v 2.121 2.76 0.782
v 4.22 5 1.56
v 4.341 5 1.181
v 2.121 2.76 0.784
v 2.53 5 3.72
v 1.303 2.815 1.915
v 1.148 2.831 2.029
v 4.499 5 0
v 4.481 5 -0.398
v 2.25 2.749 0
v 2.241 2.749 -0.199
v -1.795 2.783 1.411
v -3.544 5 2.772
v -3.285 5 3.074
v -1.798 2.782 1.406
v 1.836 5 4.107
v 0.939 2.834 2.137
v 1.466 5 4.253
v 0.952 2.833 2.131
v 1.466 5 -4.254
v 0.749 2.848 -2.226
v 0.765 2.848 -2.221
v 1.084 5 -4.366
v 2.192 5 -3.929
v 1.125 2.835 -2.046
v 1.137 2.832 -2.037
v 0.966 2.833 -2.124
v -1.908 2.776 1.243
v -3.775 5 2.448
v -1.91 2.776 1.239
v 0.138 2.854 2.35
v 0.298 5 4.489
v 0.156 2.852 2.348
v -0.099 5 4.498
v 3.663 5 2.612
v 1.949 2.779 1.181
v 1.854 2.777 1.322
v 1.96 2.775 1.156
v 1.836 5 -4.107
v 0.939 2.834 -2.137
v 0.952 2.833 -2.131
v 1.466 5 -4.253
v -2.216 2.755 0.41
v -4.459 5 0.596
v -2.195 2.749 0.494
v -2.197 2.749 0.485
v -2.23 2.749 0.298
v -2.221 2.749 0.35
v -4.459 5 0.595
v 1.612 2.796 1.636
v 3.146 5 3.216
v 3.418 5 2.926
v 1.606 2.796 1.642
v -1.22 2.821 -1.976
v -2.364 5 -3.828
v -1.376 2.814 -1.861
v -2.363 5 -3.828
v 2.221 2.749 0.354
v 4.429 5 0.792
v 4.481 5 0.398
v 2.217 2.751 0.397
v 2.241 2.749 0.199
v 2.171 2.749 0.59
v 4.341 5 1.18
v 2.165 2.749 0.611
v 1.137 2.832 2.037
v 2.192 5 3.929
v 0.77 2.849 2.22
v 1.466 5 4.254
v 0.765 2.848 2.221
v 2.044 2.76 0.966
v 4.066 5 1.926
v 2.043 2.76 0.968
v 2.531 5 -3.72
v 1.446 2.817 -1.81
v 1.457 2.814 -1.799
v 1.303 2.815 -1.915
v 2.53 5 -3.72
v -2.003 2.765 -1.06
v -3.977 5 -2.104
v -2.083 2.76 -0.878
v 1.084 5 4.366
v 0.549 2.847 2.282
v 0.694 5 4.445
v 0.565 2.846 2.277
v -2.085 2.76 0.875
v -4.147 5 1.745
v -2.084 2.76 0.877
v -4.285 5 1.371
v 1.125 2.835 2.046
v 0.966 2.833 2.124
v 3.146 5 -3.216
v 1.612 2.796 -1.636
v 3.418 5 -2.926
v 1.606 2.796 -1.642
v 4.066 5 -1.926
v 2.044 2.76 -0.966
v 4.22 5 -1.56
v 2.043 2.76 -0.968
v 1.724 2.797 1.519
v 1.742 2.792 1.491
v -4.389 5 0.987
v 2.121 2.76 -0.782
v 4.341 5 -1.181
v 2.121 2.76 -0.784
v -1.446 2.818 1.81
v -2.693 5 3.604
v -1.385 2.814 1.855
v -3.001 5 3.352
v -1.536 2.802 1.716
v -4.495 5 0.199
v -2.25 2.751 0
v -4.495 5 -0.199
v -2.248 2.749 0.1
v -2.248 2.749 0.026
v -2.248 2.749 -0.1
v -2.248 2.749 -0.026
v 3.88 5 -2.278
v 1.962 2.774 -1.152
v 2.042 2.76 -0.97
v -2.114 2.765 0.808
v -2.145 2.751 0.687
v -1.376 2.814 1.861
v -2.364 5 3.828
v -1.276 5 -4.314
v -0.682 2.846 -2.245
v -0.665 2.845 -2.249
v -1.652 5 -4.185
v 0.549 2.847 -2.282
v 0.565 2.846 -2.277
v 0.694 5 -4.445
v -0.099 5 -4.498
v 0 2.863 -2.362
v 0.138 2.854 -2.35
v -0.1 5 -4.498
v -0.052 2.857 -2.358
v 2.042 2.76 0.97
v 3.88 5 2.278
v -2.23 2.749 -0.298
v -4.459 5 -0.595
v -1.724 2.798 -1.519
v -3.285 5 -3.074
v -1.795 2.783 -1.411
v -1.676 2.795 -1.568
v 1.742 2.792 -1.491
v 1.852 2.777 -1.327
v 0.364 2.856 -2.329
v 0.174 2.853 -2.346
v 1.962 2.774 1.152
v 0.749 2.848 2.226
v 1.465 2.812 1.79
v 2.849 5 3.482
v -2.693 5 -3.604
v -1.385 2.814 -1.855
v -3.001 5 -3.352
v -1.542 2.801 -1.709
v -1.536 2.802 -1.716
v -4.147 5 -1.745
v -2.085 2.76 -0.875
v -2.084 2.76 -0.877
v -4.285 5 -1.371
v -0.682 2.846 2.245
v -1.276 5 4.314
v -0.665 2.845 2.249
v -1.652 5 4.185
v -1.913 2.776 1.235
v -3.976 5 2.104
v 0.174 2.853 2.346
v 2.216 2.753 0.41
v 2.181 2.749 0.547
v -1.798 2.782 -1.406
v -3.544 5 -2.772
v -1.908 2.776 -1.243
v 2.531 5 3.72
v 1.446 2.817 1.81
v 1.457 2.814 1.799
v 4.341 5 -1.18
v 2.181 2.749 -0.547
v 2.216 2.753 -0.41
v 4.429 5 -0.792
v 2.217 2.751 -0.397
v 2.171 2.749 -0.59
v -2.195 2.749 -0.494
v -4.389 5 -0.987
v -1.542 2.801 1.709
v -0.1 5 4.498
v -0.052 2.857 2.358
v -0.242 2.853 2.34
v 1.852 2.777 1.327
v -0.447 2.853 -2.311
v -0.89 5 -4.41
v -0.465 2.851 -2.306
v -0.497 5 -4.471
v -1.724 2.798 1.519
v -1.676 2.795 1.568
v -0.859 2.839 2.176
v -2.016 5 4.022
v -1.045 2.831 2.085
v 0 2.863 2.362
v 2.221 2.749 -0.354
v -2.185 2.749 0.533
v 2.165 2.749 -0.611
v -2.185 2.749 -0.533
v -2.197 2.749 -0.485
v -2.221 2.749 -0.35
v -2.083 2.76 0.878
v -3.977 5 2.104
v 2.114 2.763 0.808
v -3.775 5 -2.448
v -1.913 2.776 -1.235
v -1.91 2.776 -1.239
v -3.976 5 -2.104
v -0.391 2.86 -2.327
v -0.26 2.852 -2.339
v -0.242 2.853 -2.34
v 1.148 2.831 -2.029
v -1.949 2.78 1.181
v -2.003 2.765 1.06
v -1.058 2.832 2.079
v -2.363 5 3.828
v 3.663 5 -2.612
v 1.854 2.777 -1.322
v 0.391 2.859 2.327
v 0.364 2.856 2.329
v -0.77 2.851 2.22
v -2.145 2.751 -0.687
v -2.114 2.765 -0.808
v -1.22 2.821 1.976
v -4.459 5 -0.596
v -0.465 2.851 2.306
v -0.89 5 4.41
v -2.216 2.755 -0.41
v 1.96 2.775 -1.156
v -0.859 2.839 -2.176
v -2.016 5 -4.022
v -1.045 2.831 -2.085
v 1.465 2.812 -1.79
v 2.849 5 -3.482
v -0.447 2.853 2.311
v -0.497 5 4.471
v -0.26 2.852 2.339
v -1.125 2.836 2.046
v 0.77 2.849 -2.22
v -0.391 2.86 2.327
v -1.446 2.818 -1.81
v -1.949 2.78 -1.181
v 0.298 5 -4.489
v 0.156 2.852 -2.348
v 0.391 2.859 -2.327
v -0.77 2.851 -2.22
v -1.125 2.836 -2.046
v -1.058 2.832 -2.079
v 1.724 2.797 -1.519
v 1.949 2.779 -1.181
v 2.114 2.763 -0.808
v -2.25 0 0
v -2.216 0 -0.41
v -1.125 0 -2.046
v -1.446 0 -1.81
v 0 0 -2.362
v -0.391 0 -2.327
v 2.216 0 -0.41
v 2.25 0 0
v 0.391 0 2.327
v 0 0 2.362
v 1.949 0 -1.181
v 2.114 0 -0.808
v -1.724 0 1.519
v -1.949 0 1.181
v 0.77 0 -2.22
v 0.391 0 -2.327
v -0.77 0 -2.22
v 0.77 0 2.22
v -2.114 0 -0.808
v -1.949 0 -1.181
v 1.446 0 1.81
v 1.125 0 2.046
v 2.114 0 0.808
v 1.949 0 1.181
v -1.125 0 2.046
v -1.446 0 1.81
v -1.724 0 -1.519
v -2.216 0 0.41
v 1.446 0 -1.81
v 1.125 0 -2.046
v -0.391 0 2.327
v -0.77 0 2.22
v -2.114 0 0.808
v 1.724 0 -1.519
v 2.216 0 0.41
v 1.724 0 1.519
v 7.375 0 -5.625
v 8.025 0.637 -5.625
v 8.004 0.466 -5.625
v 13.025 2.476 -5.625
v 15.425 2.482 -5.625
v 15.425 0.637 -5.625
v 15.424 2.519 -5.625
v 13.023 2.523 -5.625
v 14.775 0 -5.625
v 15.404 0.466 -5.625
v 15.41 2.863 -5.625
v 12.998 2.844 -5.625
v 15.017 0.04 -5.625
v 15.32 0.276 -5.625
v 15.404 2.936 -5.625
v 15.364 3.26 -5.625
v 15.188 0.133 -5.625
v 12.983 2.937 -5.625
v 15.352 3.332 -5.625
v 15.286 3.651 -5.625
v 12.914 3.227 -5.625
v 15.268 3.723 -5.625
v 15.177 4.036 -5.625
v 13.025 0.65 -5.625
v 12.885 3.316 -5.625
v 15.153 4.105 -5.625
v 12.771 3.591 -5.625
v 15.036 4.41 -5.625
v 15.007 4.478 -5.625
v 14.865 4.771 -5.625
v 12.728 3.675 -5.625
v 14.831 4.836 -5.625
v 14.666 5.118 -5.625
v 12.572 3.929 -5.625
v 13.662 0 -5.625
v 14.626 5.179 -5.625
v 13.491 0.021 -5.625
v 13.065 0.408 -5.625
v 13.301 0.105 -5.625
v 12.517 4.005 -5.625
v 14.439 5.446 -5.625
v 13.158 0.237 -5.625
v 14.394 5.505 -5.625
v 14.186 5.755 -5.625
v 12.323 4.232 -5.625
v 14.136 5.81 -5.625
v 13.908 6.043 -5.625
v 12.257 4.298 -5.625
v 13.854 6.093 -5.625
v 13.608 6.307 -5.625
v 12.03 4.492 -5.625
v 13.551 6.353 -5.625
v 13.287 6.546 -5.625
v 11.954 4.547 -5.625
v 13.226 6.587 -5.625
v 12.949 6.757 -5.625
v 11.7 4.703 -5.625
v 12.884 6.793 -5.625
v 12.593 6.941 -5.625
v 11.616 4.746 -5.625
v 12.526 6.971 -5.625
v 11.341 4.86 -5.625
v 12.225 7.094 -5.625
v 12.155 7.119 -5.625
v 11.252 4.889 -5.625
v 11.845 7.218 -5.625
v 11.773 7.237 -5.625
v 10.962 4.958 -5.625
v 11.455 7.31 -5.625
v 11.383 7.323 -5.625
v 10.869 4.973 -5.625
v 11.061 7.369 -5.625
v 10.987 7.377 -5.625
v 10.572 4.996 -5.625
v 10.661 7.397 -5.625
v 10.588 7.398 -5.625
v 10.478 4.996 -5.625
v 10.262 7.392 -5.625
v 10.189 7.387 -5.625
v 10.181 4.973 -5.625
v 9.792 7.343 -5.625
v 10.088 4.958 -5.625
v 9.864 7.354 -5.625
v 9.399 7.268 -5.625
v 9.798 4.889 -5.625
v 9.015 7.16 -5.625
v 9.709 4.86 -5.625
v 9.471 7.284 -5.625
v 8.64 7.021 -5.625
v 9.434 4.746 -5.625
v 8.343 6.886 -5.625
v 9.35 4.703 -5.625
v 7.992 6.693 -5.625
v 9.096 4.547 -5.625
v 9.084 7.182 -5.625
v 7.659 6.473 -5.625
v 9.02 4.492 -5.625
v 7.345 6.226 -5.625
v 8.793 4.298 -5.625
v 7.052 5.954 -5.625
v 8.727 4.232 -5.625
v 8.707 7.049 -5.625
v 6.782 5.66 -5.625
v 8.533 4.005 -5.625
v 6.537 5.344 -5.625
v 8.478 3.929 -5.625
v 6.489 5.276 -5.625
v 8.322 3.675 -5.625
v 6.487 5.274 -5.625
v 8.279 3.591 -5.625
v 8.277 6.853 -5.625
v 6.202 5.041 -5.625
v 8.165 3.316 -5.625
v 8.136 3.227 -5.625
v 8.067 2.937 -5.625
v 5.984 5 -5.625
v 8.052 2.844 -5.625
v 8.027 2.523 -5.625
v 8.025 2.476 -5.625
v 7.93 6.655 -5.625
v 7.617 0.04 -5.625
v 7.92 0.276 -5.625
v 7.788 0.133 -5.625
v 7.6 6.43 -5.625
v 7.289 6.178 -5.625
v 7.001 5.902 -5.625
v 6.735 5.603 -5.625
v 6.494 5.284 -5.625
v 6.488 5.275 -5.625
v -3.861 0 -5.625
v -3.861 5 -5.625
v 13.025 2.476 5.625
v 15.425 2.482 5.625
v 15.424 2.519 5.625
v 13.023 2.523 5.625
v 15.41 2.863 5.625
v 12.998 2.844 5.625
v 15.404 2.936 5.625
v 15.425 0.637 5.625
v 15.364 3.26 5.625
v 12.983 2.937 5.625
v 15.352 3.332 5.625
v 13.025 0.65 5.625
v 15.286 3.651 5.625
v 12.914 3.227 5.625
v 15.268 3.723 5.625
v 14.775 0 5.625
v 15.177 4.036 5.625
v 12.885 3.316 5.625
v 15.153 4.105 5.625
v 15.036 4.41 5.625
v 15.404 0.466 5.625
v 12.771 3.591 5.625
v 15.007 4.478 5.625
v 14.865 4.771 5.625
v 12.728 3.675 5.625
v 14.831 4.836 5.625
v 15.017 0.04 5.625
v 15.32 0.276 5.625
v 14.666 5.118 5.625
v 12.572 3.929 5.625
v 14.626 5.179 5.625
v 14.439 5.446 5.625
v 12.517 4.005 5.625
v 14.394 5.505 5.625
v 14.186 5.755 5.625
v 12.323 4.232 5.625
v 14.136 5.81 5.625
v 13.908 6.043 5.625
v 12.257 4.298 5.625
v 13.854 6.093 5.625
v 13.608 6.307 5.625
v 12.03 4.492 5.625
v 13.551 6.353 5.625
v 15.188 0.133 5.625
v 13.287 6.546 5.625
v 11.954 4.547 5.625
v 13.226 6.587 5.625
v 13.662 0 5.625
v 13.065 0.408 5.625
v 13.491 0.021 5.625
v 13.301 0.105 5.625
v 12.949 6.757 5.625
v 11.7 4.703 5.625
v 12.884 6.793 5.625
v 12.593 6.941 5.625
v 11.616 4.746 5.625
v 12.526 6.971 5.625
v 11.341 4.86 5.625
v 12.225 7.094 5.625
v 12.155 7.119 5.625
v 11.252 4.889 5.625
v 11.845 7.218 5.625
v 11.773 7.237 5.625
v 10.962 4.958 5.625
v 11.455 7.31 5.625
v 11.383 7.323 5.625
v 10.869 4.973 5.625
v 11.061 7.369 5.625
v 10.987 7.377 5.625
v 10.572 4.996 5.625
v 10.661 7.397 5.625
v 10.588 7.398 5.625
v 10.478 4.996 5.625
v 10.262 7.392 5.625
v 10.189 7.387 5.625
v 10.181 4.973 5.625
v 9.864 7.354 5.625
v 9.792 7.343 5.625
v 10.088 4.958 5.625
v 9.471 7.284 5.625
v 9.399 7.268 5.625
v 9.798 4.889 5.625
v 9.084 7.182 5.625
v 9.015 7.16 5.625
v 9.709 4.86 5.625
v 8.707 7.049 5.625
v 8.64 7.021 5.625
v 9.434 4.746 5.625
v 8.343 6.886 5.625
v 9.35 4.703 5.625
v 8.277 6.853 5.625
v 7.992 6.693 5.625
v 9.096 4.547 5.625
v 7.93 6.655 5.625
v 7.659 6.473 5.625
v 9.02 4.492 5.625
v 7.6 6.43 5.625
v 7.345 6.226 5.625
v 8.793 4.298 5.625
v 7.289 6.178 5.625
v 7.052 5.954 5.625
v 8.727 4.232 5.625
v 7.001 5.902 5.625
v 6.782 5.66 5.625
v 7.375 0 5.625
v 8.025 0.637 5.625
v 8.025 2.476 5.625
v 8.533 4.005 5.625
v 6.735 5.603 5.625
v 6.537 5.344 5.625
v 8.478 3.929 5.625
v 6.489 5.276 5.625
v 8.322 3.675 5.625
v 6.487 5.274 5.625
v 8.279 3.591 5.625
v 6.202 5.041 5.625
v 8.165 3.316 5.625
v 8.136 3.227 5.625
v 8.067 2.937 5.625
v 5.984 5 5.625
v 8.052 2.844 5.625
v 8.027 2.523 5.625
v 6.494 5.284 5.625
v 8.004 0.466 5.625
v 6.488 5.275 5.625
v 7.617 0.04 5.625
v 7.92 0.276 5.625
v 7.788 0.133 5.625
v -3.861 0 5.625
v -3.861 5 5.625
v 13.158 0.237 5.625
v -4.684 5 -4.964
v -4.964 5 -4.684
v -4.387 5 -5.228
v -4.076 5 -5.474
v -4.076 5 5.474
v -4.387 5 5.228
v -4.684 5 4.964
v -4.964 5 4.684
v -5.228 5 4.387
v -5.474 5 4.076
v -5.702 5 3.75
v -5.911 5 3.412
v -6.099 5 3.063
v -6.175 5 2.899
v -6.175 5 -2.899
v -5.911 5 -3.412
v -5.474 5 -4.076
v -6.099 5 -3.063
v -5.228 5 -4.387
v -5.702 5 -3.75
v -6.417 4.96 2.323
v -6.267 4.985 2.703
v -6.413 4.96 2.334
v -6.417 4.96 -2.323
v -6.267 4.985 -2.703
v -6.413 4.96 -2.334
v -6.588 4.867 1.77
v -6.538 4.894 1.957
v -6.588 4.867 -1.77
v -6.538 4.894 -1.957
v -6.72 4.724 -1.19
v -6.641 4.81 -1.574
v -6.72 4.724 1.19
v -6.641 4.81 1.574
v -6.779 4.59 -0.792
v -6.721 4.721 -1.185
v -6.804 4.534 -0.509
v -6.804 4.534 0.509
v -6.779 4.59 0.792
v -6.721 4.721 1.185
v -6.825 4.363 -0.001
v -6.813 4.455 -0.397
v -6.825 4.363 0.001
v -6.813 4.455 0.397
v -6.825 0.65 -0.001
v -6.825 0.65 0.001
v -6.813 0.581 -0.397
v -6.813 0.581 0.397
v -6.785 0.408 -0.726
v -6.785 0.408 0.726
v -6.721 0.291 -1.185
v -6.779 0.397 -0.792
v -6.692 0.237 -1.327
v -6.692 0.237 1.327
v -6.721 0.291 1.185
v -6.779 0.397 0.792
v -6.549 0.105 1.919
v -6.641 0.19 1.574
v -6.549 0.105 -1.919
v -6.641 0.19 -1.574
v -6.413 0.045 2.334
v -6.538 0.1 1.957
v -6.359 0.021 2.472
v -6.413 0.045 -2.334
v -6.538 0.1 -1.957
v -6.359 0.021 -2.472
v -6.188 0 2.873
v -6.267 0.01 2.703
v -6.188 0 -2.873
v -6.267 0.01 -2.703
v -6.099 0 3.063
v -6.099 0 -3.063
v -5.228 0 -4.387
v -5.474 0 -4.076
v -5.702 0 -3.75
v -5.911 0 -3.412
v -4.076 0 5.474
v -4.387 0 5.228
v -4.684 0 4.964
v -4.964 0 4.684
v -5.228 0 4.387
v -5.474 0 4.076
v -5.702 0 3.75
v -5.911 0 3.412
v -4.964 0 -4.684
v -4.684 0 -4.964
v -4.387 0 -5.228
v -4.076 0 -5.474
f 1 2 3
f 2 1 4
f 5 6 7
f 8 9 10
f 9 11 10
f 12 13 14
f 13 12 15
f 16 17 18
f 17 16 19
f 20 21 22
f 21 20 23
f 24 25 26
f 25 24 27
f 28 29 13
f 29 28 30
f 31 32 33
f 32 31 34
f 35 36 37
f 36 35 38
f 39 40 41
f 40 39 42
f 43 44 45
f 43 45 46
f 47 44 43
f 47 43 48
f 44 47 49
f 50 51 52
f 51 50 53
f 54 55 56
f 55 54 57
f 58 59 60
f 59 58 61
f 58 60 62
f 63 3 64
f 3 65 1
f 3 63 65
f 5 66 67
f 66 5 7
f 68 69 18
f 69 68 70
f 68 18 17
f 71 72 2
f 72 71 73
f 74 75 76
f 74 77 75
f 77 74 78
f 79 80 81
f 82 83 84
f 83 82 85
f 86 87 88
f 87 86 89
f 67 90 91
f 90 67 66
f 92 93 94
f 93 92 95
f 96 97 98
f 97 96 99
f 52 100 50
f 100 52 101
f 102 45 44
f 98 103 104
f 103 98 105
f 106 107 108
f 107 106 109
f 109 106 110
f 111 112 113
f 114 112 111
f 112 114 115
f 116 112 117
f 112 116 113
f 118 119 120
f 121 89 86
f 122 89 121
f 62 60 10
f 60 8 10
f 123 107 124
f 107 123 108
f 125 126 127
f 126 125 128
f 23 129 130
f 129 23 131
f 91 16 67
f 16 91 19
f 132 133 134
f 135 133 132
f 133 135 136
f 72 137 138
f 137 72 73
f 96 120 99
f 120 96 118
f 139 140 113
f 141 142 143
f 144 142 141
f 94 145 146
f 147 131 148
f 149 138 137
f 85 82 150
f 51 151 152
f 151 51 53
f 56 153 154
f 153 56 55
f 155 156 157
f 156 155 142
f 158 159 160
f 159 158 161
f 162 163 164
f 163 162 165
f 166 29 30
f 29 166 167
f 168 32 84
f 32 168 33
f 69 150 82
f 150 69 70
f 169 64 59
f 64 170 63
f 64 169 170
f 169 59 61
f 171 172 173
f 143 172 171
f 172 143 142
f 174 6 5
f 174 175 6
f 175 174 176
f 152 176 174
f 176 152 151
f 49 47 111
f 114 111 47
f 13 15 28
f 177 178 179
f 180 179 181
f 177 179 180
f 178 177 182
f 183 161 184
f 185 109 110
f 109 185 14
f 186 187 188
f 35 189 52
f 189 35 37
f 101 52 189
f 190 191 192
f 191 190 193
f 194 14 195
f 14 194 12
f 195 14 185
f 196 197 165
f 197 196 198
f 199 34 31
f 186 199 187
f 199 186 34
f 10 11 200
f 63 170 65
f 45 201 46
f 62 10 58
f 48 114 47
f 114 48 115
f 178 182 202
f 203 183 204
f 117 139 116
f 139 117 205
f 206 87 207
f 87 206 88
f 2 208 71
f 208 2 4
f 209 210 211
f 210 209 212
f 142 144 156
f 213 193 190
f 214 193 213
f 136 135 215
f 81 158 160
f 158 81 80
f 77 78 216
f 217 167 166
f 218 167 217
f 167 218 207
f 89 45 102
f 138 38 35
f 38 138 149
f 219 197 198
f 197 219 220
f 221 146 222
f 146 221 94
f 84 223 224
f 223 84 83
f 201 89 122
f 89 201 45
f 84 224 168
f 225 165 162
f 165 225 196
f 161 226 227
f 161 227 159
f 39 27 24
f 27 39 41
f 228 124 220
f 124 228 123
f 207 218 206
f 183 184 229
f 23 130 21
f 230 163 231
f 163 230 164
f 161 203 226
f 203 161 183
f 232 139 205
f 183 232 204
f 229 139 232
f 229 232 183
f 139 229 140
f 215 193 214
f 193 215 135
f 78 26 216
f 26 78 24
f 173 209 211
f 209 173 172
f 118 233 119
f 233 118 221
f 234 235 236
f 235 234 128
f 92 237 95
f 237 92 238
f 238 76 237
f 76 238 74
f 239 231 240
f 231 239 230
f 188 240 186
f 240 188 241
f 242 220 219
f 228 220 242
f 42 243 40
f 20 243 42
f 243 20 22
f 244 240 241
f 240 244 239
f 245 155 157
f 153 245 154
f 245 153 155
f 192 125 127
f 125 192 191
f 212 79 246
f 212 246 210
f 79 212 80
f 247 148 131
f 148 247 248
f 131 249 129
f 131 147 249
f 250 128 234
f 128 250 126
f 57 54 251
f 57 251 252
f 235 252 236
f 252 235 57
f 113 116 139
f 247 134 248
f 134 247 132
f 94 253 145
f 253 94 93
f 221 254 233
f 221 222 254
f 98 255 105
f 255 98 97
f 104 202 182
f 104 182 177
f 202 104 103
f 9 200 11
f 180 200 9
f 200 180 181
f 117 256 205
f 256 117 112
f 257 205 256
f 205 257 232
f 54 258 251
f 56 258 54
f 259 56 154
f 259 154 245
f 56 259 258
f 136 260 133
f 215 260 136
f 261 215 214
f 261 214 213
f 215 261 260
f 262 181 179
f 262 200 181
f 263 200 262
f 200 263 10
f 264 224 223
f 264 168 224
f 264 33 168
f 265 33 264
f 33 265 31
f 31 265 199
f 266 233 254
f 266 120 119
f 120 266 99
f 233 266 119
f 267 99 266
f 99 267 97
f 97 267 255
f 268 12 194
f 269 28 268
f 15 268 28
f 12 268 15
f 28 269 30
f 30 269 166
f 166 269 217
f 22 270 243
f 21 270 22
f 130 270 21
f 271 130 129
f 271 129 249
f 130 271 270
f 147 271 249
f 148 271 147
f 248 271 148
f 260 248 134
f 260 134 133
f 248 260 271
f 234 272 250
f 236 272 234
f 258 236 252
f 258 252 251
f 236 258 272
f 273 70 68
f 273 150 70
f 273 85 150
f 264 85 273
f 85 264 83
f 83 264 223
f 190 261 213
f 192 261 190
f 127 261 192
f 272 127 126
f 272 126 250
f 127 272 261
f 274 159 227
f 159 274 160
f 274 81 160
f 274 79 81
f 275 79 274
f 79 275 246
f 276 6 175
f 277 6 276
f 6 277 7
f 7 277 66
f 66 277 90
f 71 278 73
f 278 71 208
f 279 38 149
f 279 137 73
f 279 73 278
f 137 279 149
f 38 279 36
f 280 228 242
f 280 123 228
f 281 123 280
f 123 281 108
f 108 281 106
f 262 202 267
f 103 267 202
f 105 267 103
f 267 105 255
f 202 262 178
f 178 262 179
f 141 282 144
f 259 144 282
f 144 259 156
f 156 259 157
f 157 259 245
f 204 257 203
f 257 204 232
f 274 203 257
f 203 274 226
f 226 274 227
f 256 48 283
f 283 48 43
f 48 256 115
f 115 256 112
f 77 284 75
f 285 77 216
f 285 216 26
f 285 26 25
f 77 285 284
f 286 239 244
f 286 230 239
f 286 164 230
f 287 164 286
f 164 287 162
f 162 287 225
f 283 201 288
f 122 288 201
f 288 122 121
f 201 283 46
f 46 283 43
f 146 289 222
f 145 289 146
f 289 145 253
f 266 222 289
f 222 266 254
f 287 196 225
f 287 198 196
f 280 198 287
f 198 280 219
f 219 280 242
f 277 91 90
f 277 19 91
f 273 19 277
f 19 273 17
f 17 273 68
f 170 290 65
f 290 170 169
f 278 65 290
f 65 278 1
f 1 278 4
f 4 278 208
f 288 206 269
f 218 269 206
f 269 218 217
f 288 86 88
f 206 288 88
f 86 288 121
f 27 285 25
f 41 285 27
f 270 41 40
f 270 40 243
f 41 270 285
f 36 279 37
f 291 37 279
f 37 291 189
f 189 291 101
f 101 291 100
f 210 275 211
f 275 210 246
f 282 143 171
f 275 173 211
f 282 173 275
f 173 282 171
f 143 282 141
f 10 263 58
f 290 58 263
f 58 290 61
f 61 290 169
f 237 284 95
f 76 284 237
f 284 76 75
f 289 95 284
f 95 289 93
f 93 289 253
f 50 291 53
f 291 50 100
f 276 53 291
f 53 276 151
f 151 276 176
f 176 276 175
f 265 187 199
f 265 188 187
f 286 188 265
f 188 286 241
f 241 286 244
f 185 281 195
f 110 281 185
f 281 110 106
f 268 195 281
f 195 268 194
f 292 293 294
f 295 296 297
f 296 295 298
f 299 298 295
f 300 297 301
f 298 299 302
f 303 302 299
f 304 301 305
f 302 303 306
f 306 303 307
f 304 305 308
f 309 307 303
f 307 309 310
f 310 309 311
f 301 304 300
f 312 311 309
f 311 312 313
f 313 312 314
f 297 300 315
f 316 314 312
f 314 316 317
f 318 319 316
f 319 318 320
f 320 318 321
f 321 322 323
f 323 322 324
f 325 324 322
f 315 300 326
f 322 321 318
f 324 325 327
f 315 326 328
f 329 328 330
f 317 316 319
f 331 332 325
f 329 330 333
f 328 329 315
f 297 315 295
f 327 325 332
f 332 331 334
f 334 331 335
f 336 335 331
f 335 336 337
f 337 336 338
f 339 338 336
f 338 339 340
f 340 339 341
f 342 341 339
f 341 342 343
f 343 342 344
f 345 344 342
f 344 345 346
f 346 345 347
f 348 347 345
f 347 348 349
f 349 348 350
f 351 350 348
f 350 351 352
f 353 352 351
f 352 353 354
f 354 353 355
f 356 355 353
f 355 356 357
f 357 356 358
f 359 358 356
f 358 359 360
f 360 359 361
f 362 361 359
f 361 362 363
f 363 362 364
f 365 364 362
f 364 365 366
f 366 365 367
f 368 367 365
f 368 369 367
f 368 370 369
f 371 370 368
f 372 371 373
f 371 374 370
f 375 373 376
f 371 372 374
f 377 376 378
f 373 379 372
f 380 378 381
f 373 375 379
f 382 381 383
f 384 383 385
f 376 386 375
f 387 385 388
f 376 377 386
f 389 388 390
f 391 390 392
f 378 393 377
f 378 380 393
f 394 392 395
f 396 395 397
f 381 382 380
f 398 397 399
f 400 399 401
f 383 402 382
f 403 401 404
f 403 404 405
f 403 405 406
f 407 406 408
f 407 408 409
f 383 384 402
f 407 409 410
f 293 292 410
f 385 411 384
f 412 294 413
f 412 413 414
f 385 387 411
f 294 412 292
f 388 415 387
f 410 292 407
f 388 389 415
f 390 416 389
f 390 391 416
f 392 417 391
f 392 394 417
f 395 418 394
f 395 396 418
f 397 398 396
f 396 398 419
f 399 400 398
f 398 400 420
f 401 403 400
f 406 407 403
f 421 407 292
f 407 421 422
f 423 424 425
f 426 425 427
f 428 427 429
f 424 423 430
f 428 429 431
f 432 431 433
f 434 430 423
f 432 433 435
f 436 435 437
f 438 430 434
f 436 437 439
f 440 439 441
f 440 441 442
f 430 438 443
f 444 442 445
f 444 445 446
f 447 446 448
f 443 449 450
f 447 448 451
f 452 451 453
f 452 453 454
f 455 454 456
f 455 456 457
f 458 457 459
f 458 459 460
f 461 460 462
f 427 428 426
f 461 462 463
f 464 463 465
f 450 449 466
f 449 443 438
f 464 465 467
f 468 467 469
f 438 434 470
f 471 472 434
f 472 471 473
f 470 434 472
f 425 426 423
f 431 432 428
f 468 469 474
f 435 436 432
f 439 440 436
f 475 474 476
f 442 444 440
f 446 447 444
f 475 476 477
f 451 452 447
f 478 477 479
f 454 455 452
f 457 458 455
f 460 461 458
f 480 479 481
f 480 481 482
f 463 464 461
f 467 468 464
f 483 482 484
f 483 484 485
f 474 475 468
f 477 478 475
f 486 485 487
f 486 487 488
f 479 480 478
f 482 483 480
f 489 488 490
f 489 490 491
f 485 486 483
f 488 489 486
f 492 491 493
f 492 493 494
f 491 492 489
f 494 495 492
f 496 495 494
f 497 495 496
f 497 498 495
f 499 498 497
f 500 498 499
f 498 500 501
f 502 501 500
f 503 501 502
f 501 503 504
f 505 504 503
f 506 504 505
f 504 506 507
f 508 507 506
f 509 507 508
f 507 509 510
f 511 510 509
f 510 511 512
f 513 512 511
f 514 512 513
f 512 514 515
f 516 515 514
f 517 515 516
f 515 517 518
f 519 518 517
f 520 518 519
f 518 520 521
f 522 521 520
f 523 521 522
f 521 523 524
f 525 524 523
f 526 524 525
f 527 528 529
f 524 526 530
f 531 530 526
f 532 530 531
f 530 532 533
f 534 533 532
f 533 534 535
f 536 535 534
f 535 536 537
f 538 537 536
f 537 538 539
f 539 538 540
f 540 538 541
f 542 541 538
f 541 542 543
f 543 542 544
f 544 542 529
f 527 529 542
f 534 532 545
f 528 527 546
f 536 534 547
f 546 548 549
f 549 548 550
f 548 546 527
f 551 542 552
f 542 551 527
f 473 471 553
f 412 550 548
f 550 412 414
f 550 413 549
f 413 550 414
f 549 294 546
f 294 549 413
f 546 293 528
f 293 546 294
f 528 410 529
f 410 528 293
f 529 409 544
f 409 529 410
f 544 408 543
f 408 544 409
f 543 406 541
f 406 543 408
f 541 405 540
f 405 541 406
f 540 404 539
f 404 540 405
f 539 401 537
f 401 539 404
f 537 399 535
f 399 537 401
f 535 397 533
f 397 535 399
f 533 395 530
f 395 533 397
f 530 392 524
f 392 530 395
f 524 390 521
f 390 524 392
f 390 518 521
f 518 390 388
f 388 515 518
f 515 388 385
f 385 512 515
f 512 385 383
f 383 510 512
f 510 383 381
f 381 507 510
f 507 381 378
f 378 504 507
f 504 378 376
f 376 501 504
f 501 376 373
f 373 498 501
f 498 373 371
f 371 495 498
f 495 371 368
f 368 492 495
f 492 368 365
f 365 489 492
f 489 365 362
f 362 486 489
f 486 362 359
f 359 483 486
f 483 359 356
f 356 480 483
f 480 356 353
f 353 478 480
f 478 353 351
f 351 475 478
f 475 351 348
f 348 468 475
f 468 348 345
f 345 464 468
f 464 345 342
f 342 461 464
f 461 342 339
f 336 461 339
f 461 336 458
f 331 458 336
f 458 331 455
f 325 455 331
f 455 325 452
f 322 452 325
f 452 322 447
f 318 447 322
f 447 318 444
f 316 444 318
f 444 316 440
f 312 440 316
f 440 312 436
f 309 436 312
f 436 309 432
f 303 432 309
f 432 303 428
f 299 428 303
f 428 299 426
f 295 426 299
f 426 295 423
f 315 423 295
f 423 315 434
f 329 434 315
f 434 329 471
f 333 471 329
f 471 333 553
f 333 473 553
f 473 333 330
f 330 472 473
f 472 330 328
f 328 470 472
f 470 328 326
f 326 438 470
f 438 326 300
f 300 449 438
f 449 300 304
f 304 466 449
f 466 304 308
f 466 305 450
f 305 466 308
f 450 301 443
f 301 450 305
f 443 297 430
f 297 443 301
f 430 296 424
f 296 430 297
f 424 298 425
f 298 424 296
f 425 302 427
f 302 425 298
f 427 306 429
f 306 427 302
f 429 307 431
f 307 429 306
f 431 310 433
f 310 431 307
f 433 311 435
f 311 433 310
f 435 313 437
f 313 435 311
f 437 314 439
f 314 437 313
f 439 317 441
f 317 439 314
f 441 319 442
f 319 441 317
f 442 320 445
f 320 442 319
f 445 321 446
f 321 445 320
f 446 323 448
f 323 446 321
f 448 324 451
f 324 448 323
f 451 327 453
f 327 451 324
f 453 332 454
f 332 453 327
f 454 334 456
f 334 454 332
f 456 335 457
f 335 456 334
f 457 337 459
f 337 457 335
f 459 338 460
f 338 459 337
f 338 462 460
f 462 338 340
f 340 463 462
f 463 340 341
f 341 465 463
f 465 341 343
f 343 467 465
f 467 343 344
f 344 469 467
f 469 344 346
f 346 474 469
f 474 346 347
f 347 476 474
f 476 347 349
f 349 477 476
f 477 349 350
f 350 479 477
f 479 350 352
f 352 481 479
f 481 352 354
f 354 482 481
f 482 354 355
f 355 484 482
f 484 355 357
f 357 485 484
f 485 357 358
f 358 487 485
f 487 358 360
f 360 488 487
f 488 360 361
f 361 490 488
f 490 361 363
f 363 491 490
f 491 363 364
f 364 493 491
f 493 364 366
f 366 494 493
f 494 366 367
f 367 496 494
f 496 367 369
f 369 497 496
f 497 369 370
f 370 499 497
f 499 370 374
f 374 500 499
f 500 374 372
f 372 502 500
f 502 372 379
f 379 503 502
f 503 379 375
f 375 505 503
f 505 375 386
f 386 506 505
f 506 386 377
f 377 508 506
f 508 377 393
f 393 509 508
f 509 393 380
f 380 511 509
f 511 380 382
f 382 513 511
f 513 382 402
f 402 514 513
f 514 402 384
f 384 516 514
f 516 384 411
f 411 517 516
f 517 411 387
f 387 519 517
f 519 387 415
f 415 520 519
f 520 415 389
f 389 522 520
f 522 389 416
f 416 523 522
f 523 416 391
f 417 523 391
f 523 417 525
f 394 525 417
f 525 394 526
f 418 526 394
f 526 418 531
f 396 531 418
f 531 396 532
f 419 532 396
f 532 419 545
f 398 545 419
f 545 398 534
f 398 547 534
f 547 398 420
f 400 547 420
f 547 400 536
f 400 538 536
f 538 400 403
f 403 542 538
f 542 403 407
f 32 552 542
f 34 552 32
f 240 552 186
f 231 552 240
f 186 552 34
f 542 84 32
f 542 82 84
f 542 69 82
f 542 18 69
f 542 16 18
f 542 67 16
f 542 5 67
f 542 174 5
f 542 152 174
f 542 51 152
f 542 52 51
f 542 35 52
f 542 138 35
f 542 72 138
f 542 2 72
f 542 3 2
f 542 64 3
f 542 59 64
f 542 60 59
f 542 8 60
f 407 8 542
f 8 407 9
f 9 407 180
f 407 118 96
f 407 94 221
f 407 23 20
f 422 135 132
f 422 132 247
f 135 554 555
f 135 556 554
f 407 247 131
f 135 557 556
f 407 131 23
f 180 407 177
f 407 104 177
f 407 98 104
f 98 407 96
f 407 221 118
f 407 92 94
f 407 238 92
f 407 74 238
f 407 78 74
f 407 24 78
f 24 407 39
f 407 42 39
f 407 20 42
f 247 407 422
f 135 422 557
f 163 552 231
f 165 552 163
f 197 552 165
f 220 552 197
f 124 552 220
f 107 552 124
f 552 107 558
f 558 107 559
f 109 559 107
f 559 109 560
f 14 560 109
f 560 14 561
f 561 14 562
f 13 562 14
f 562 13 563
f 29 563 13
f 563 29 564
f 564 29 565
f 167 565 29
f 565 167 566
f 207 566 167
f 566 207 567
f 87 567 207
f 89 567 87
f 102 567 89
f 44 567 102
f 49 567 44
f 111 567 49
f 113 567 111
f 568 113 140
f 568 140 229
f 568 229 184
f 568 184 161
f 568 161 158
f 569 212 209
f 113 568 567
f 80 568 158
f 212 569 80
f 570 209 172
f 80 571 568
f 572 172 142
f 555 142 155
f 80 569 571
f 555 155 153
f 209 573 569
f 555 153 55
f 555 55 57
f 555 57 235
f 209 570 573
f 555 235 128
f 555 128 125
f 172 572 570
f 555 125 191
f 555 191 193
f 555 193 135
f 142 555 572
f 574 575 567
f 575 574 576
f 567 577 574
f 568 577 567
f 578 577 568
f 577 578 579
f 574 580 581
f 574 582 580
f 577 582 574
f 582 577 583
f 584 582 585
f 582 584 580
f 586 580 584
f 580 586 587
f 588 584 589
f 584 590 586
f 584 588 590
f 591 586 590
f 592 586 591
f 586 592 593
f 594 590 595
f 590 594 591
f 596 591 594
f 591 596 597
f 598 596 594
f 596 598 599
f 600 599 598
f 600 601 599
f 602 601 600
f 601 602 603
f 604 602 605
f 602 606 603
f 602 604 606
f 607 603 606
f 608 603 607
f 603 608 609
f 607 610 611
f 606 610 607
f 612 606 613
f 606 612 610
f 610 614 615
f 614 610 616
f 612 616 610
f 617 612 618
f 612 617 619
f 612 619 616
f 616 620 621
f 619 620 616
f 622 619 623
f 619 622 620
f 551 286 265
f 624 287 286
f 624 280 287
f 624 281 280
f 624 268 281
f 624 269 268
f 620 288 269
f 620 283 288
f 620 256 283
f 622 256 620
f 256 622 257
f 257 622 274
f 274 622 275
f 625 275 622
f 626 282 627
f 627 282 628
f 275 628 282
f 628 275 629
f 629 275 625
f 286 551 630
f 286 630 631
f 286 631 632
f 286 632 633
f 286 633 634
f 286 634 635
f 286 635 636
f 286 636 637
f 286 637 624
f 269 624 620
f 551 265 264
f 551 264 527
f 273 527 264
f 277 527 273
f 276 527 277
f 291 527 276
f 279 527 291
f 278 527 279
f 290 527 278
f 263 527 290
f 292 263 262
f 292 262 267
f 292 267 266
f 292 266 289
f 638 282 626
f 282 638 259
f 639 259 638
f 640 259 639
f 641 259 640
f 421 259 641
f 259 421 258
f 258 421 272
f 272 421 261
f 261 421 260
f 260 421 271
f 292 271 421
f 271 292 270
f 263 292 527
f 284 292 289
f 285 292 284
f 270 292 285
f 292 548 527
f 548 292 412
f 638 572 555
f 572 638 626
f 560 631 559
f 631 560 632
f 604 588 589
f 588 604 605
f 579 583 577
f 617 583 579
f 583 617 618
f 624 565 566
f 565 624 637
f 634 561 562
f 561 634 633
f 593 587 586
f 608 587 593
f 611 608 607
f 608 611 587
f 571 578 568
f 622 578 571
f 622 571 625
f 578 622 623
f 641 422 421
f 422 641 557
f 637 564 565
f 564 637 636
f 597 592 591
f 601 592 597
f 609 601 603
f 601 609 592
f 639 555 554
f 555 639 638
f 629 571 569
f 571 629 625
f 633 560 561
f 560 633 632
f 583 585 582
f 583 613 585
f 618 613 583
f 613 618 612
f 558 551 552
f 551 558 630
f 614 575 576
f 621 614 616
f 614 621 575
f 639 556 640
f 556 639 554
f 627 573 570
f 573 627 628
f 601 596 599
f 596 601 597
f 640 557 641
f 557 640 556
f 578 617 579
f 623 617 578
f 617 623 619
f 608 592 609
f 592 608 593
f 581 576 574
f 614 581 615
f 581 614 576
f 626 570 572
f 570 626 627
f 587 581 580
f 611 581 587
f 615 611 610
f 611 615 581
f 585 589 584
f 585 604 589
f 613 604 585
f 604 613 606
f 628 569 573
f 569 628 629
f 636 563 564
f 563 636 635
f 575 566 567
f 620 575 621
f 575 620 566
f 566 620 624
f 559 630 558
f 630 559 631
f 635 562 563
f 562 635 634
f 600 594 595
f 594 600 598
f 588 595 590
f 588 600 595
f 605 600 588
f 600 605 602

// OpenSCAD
/*
 * Cable clips
 * By smkent (GitHub) / bulbasaur0 (Printables)
 *
 * Licensed under Creative Commons (4.0 International License) Attribution-ShareAlike
 */

/* [Rendering Options] */
Print_Orientation = true;

/* [Size] */
// All units in millimeters

Thickness = 2.4;
Clip_Diameter = 5;
Screw_Diameter = 4.5; // [1:0.1:10]

/* [Clip Options] */
Countersink_Screw = true;

/* [Development Toggles] */

module __end_customizer_options__() { }

// Constants //

$fa = $preview ? $fa : 2;
$fs = $preview ? $fs : 0.4;

width = Screw_Diameter * 2.5;
clip_od = Clip_Diameter + Thickness * 2;
slop = 0.001;
foot_height = Clip_Diameter;

// Modules //

module at_clip_hook() {
    translate([width / 2 + Thickness + Clip_Diameter / 2, 0])
    children();
}

module round_circle(od, extend=0) {
    hull() {
        circle(d=od);
        translate([-od / 2, -od / 2 - extend])
        square([od, od / 2]);
    }
}

module clip_hook_cut() {
    difference() {
        children();
        at_clip_hook()
        translate([0, Clip_Diameter / 2])
        round_circle(Clip_Diameter, extend=Thickness * 2);
    }
}

module clip_hook() {
    at_clip_hook()
    intersection() {
        translate([0, Clip_Diameter / 2])
        round_circle(clip_od);
        translate([-clip_od * 5, 0])
        square([clip_od * 10, clip_od * 10]);
    }
}

module clip_foot() {
    translate([-(width + Thickness) / 2, 0])
    square([width + Thickness * 2, foot_height]);
}

module screw_hole() {
    rotate([270, 0, 0])
    translate([0, 0, -Screw_Diameter / 2 + foot_height])
    union() {
        if (Countersink_Screw) {
            translate([0, 0, -slop])
            cylinder(d1=Screw_Diameter, d2=Screw_Diameter * 2, h=Screw_Diameter / 2 + slop * 2);
            translate([0, 0, Screw_Diameter / 2])
            cylinder(h=(Thickness + Clip_Diameter) * 2, d=Screw_Diameter * 2);
        }
        translate([0, 0, foot_height * 2])
        scale([1, 1.05])
        mirror([0, 0, 1])
        cylinder(h=(foot_height + Clip_Diameter) * 2, d=Screw_Diameter);
    }
}

module add_screw_hole() {
    difference() {
        children();
        screw_hole();
    }
}

module clip_edges() {
    intersection() {
        children();
        hull() {
            rotate([90, 0, 0])
            cylinder(d=width + Thickness, h=foot_height * 10, center=true);
            translate([(Clip_Diameter + Thickness) * 2, 0, 0])
            cube([width, foot_height * 10, width + Thickness], center=true);
        }
    }
}

module clip() {
    rr = min(Thickness, Clip_Diameter) * 0.25;
    clip_edges()
    add_screw_hole()
    linear_extrude(height=width, center=true)
    offset(r=-rr)
    offset(r=rr * 2)
    offset(r=-rr)
    clip_hook_cut()
    union() {
        clip_hook();
        clip_foot();
    }
}

module orient_model() {
    if (Print_Orientation) {
        children();
    } else {
        rotate([90, 0, 0])
        children();
    }
}

module main() {
    orient_model()
    color("lemonchiffon", 0.9)
    render()
    clip();
}

main();
